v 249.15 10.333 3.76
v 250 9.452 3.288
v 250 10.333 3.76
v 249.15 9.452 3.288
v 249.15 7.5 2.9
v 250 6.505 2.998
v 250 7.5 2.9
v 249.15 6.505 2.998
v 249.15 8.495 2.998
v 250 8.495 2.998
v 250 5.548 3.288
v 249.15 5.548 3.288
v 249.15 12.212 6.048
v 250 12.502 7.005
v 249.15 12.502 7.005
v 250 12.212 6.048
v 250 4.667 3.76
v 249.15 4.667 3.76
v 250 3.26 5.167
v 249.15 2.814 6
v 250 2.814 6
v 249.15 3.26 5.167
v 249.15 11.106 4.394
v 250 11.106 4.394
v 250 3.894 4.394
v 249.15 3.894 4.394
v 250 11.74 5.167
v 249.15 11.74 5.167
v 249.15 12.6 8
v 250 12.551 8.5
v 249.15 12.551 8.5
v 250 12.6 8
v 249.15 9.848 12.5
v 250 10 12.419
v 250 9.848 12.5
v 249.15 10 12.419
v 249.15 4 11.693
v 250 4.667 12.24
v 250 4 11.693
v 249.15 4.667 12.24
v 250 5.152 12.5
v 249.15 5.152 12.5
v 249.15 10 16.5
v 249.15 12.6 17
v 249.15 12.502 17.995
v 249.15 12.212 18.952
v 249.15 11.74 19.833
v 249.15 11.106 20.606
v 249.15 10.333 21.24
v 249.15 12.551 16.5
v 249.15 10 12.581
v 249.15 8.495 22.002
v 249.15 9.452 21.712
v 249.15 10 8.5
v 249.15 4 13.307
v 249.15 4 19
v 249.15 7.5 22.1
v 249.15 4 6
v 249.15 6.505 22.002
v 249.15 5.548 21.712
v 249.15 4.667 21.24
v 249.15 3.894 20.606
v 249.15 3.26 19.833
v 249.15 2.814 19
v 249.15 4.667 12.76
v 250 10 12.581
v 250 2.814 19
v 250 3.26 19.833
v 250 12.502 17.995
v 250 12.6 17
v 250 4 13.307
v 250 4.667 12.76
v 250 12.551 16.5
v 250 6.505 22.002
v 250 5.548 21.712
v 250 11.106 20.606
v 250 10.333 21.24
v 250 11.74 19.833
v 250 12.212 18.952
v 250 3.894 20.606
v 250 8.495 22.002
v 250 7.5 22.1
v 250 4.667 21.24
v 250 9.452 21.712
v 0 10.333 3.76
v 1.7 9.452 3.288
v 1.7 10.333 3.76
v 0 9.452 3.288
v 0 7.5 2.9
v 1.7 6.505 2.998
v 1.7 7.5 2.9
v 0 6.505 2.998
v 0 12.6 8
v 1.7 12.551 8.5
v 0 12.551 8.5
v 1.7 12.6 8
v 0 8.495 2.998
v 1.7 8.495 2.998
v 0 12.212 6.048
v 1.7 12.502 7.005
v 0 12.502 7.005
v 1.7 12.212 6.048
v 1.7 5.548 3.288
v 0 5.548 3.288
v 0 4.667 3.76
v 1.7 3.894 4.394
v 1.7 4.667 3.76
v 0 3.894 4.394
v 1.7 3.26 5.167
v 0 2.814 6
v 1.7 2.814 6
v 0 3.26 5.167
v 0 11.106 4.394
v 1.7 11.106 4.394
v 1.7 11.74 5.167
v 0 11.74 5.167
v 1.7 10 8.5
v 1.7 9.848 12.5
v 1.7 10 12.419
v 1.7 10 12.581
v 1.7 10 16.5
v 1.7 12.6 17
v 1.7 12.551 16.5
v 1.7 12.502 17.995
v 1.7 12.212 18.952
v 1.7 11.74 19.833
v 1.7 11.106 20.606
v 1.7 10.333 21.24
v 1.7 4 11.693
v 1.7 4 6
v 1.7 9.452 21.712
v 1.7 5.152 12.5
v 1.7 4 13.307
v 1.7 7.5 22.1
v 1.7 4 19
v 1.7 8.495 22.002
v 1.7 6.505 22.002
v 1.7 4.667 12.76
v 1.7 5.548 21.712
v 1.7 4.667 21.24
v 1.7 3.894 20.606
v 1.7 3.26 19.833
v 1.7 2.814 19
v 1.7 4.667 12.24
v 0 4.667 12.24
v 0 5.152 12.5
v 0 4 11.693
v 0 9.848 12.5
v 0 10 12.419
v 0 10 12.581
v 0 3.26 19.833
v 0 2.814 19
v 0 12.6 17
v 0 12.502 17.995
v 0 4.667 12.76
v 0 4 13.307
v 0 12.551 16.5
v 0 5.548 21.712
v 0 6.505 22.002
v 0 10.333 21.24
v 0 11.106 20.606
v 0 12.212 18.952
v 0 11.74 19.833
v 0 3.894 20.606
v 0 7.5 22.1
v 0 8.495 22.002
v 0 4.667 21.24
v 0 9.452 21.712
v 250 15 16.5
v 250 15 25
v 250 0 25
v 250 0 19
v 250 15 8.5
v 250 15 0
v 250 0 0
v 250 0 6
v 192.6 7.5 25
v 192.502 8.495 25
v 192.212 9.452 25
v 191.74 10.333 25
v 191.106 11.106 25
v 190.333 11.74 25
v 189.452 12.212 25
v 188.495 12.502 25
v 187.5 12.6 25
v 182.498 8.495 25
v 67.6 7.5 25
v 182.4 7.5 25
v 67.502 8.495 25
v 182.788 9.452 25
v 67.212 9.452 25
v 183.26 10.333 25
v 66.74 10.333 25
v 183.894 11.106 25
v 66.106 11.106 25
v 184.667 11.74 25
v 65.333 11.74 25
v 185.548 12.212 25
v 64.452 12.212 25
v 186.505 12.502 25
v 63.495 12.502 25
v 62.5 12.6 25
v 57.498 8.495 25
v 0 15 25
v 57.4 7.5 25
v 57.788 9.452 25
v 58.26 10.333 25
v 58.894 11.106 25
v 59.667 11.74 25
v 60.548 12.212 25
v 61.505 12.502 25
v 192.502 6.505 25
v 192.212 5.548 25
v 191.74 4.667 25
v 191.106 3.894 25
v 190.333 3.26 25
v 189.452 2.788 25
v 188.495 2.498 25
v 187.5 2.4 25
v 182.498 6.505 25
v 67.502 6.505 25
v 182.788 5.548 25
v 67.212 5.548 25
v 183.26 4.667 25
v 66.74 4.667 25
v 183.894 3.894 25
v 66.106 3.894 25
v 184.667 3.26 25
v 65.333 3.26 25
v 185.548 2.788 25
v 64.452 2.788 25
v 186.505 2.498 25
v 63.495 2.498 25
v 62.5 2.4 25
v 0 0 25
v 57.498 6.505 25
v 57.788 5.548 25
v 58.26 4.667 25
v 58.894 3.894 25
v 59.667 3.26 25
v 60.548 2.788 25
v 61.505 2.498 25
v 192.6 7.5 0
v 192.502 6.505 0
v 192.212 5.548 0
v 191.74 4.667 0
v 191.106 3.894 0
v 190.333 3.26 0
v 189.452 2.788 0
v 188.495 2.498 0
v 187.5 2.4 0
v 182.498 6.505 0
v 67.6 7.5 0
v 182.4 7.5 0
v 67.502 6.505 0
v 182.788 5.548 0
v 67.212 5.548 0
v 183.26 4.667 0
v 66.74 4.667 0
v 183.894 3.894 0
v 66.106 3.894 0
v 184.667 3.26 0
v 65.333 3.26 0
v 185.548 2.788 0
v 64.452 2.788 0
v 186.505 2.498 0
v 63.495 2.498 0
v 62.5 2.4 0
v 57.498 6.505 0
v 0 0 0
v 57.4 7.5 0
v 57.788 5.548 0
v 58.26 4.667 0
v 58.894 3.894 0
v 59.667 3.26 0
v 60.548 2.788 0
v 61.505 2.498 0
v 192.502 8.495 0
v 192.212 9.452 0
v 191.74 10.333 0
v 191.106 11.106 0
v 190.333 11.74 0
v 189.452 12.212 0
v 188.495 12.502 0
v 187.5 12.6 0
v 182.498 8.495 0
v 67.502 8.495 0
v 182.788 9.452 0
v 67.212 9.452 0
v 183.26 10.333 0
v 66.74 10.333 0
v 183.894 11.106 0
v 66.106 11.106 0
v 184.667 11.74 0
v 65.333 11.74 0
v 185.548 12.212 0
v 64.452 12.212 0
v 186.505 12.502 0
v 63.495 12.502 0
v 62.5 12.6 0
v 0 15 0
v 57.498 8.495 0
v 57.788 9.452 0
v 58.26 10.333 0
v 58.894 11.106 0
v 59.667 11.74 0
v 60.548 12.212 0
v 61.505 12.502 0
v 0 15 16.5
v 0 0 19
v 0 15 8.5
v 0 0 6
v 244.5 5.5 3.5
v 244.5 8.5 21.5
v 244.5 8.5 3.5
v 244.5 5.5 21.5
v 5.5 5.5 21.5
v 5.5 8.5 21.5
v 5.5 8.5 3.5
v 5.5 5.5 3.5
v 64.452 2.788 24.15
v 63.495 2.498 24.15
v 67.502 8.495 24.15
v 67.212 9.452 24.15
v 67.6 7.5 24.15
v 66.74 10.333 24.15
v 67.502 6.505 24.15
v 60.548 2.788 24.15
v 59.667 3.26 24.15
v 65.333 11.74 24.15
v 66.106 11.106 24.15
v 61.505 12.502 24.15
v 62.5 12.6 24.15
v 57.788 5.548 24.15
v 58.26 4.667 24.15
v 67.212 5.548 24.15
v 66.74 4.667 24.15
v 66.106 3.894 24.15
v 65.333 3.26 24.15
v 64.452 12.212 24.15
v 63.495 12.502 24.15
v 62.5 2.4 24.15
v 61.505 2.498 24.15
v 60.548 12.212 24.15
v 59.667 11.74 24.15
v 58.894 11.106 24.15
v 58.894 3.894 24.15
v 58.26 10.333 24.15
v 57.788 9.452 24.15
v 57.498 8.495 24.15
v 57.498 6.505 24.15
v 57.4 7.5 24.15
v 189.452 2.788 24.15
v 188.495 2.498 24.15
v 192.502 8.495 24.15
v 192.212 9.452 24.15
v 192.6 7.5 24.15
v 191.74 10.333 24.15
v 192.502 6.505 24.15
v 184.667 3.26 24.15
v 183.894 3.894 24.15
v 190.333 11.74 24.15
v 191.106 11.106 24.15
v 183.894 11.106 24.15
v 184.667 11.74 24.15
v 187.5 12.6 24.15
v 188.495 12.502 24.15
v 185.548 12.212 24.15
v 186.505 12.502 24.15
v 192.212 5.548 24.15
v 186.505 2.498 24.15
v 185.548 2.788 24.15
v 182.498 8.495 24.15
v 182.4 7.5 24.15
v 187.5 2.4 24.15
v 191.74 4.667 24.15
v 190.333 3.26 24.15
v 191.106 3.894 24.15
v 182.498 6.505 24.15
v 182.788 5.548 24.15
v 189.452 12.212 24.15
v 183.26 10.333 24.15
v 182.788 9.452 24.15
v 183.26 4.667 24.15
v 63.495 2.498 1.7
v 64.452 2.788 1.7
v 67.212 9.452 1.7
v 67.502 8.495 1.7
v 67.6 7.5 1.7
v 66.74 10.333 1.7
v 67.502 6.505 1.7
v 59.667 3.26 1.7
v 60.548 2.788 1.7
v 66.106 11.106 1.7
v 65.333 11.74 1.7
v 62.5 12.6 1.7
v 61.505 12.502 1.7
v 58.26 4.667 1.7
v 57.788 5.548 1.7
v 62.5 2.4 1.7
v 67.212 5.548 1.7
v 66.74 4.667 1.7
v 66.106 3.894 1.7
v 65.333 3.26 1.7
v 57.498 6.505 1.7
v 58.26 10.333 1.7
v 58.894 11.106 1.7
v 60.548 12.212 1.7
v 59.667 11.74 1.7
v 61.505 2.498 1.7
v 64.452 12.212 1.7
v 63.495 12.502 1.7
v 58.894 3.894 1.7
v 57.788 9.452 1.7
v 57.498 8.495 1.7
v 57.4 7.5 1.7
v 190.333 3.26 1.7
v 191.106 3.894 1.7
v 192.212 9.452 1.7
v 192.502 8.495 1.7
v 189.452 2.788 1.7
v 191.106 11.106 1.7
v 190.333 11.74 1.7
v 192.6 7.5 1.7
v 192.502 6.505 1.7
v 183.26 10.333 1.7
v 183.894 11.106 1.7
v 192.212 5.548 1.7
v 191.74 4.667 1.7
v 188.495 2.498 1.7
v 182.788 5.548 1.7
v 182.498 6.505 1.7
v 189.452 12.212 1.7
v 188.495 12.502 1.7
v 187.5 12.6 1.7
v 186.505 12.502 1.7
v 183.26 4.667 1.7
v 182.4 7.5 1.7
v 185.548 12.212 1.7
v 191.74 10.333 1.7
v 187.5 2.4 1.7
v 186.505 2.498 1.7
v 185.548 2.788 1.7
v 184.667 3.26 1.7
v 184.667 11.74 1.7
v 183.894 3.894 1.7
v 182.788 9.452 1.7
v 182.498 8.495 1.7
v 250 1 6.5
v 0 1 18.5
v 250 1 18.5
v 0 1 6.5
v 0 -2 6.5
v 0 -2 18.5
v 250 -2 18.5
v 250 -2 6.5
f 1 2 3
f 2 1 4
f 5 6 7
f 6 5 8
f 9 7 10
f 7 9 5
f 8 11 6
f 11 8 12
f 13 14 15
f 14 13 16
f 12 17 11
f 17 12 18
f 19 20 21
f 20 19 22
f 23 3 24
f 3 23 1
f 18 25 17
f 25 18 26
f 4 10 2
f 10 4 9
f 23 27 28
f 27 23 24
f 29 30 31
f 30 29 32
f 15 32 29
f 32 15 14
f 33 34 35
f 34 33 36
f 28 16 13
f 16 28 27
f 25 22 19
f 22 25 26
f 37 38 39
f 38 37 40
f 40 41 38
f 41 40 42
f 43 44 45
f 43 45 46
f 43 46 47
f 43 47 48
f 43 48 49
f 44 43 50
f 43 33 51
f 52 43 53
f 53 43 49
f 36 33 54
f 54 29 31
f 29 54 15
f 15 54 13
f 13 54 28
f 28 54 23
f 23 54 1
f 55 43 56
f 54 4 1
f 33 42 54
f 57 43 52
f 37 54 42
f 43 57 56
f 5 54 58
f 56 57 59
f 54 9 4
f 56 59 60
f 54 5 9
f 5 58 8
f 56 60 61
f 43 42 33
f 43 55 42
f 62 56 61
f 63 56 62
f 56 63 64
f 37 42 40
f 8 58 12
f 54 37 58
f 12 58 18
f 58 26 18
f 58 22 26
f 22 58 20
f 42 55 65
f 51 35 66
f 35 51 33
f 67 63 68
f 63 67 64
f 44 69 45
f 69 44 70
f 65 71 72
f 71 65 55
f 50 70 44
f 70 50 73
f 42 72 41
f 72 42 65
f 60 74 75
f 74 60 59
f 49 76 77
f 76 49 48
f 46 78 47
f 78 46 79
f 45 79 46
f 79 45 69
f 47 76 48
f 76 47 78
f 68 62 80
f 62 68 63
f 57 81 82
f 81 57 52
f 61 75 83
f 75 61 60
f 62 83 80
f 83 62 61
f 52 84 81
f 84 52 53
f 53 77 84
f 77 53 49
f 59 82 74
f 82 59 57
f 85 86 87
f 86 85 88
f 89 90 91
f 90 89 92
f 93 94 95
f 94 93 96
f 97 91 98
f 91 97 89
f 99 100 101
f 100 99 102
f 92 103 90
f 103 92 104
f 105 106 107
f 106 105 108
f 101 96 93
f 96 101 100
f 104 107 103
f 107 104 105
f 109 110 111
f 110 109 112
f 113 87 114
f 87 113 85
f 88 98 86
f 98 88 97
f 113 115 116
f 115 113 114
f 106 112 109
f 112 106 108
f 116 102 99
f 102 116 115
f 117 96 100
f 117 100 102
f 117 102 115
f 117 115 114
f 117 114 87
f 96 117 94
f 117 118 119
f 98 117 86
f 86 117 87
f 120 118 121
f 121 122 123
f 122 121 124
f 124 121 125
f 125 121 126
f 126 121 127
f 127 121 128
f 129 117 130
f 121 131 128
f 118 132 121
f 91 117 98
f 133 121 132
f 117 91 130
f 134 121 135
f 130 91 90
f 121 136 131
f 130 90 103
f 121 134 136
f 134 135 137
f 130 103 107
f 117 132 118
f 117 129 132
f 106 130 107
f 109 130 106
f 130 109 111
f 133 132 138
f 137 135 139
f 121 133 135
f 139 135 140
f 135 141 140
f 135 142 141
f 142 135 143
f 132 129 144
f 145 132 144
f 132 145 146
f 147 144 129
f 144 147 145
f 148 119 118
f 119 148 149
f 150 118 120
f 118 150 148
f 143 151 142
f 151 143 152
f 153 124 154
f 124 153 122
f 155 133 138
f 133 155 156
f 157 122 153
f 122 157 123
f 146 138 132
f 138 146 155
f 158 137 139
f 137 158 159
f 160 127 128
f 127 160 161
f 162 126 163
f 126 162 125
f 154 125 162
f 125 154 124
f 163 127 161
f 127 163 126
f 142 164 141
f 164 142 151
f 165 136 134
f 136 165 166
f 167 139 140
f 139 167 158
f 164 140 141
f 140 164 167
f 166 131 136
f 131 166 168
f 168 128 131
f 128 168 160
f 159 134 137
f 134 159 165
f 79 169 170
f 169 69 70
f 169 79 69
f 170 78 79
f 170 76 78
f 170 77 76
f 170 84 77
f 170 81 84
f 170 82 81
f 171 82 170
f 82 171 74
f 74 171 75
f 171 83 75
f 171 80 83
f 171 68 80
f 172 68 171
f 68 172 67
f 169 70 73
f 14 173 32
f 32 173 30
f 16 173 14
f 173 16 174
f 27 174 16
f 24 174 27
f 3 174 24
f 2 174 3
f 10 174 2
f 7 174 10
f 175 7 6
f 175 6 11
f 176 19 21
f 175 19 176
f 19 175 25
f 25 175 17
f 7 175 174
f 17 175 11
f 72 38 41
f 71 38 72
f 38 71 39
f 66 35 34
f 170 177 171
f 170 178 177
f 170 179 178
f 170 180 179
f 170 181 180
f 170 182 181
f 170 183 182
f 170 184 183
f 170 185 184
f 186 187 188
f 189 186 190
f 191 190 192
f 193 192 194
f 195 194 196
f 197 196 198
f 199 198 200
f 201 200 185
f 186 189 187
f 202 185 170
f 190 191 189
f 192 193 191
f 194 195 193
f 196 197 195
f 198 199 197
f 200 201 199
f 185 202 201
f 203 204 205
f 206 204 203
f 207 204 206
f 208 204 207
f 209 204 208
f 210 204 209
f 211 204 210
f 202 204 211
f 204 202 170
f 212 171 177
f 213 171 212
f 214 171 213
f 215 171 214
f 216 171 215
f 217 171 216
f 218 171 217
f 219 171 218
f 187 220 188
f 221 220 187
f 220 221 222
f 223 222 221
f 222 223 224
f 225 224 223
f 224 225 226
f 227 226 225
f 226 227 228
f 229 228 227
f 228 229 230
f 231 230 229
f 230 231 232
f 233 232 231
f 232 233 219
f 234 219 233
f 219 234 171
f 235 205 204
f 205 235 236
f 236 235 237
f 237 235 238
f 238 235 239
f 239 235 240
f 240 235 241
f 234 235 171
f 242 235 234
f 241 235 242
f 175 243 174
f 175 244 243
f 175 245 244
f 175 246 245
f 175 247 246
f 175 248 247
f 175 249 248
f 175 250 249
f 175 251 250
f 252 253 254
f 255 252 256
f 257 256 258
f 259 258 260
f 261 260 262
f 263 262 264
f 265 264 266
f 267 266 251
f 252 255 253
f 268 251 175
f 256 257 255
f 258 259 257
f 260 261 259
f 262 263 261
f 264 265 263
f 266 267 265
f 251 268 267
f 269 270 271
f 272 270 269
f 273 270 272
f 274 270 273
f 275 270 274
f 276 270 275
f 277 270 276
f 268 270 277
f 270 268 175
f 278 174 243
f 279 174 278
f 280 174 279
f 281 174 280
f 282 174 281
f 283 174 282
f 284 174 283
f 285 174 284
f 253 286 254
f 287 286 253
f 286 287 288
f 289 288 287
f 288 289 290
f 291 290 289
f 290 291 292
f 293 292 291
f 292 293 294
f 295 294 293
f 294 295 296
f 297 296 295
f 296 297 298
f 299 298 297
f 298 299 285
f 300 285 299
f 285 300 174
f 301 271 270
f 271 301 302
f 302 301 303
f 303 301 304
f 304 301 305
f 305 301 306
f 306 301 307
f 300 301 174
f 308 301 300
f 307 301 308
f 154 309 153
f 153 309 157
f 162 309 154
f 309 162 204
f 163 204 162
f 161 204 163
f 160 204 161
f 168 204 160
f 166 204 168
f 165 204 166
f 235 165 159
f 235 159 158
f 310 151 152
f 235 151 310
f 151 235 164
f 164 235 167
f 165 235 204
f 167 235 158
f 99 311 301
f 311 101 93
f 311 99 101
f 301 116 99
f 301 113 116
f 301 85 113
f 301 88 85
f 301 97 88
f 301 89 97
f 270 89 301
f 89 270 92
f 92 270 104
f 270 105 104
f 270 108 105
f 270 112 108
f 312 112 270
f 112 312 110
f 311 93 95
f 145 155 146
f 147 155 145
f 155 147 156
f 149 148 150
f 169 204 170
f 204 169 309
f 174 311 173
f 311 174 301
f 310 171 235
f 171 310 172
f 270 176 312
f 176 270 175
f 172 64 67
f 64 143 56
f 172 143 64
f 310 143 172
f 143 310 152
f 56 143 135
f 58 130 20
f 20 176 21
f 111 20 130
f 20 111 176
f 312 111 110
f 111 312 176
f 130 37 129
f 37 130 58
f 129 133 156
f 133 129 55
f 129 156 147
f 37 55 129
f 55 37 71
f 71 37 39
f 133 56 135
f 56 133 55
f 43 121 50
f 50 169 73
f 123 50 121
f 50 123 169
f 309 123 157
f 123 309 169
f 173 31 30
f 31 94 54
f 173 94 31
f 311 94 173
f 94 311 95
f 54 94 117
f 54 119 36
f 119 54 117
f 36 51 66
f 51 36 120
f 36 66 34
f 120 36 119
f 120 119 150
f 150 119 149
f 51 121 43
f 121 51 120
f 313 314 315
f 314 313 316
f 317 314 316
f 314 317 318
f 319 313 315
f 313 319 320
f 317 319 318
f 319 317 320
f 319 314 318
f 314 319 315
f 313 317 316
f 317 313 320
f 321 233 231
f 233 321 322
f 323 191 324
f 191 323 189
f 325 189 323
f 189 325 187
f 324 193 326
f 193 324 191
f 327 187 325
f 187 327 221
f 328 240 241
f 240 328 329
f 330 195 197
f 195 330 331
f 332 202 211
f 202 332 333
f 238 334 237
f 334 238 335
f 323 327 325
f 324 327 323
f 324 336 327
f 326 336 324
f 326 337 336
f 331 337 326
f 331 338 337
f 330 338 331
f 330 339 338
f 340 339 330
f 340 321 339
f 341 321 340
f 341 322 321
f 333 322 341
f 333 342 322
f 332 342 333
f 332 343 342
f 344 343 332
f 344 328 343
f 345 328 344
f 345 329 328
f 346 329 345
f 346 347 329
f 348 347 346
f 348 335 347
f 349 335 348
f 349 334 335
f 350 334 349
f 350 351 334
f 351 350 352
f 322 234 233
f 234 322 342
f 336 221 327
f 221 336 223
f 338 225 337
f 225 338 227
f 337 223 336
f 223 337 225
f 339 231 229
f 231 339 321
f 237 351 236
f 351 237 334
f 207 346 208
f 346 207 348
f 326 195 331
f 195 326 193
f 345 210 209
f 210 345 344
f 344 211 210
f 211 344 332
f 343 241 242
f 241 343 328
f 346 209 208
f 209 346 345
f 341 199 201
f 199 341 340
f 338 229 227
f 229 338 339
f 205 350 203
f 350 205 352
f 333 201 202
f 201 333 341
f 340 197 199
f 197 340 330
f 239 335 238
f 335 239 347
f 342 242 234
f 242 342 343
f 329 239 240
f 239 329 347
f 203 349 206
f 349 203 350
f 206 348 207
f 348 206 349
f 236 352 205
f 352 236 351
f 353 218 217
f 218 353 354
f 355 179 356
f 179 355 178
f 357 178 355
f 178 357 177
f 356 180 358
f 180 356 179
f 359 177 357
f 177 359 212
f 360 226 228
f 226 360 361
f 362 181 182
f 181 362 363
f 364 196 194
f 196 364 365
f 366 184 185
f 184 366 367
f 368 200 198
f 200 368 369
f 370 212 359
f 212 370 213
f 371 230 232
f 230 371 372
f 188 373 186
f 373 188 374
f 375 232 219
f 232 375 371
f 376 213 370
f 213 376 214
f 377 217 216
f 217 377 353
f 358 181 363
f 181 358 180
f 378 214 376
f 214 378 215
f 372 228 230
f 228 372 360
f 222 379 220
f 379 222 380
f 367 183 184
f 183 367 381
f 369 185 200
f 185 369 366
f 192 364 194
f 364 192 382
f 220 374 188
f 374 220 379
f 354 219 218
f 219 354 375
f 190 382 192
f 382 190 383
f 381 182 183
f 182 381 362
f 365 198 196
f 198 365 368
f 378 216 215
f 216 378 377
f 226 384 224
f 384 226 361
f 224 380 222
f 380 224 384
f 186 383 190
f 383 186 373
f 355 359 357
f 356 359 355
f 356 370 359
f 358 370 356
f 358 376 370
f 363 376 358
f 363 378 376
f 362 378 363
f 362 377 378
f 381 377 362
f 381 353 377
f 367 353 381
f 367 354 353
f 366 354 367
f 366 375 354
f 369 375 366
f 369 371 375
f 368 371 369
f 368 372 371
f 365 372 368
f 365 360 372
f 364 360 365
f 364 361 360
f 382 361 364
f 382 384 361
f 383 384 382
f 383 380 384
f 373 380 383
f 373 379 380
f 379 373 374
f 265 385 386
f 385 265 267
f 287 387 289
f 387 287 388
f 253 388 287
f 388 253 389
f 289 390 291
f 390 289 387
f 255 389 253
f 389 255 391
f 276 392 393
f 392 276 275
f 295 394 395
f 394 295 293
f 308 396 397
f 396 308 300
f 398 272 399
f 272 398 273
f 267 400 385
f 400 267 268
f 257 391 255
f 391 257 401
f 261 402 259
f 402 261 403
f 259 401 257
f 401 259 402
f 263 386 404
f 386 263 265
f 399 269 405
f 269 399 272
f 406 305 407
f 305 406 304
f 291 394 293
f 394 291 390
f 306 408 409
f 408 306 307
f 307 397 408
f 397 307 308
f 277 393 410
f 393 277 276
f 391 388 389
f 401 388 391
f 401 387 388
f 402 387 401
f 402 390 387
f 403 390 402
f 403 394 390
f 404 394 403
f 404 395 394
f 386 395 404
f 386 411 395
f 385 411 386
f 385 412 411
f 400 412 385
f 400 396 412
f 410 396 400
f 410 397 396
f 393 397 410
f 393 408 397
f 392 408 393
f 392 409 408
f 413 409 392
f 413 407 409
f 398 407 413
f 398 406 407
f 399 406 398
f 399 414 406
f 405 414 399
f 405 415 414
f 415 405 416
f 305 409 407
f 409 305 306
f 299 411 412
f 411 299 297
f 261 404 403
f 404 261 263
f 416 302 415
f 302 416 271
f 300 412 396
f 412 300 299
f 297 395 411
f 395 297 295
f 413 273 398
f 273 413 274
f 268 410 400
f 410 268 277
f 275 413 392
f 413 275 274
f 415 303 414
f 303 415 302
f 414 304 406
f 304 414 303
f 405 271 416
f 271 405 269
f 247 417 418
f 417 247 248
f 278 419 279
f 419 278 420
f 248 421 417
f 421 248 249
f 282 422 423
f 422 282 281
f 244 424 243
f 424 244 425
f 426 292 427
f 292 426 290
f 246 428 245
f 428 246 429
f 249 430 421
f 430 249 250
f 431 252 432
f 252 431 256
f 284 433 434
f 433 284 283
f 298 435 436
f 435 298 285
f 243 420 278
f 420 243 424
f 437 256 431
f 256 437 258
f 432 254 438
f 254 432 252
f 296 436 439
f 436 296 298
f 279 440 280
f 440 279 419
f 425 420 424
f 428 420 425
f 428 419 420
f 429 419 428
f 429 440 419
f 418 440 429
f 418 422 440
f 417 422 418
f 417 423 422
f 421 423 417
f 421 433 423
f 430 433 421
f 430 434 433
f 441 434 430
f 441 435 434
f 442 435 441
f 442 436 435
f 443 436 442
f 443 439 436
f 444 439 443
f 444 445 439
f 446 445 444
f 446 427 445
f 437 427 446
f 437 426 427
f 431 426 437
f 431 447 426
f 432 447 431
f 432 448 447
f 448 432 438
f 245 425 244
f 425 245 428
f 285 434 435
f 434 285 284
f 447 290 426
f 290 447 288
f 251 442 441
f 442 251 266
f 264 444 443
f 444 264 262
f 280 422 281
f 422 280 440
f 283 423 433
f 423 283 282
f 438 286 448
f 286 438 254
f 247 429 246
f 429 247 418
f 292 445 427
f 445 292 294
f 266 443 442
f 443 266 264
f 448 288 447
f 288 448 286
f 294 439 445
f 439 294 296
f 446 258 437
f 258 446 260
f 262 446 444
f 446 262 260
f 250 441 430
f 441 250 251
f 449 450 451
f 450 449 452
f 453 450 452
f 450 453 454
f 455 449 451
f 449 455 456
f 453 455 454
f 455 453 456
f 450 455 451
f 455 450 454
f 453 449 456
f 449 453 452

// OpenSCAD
/*
 * Compact LED Strip Module - 25mm Height
 * Three types: END, MIDDLE, or ALL (all have magnets both sides)
 */

// ========== CONFIGURATION ==========

// LED Strip dimensions
strip_segment_length = 250;  // Length of this module
strip_width = 12;            // WS2812B strip width

// Module dimensions (COMPACT!)
module_width = strip_segment_length;
module_height = 25;          // Only 2.5cm tall!
module_depth = 15;           // Thin profile
wall_thickness = 1.5;

// LED channel (on front)
led_channel_depth = 4;
led_channel_width = 13;

// Wire channel (on back)
wire_channel_width = 8;
wire_channel_depth = 5;

// Magnets (adjusted for user's magnets: 10mm dia × 1.54mm thick)
magnet_dia = 10.2;           // 10mm + 0.2mm tolerance
magnet_thickness = 1.7;      // 1.54mm + tolerance (thin magnets!)
magnet_inset = 8;

// Module type - CHANGE THIS!
module_type = "middle";      // "end_left", "middle", "end_right", or "all"
show_led_strip = true;       // Show LED visualization

// ========== MODULE BUILDER ==========

module compact_holder(type="middle") {
    difference() {
        // Main body
        cube([module_width, module_depth, module_height]);

        // Front LED channel (OPEN ENDS)
        translate([-0.1, -0.1, module_height/2 - led_channel_width/2])
            cube([module_width + 0.2, led_channel_depth + 0.1, led_channel_width]);

        // Back wire channel (OPEN ENDS)
        translate([-0.1, module_depth - wire_channel_depth, module_height/2 - wire_channel_width/2])
            cube([module_width + 0.2, wire_channel_depth + 0.1, wire_channel_width]);

        // Center cavity (weight reduction)
        translate([wall_thickness + 4, led_channel_depth + wall_thickness, wall_thickness + 2])
            cube([module_width - 2*wall_thickness - 8,
                  module_depth - led_channel_depth - wire_channel_depth - 2*wall_thickness,
                  module_height - 2*wall_thickness - 4]);

        // HORIZONTAL magnets (left/right sides)
        // RIGHT side magnets
        if (type == "middle" || type == "end_left" || type == "all") {
            translate([module_width - magnet_thickness/2, module_depth/2, magnet_inset])
                rotate([0, 90, 0])
                cylinder(h=magnet_thickness + 0.1, d=magnet_dia, $fn=32);
            translate([module_width - magnet_thickness/2, module_depth/2, module_height - magnet_inset])
                rotate([0, 90, 0])
                cylinder(h=magnet_thickness + 0.1, d=magnet_dia, $fn=32);
        }

        // LEFT side magnets
        if (type == "middle" || type == "end_right" || type == "all") {
            translate([-0.1, module_depth/2, magnet_inset])
                rotate([0, 90, 0])
                cylinder(h=magnet_thickness + 0.1, d=magnet_dia, $fn=32);
            translate([-0.1, module_depth/2, module_height - magnet_inset])
                rotate([0, 90, 0])
                cylinder(h=magnet_thickness + 0.1, d=magnet_dia, $fn=32);
        }

        // VERTICAL magnets (top/bottom) - ALL types have these
        // Top
        translate([module_width/4, module_depth/2, module_height - magnet_thickness/2])
            cylinder(h=magnet_thickness + 0.1, d=magnet_dia, $fn=32);
        translate([3*module_width/4, module_depth/2, module_height - magnet_thickness/2])
            cylinder(h=magnet_thickness + 0.1, d=magnet_dia, $fn=32);

        // Bottom
        translate([module_width/4, module_depth/2, -0.1])
            cylinder(h=magnet_thickness + 0.1, d=magnet_dia, $fn=32);
        translate([3*module_width/4, module_depth/2, -0.1])
            cylinder(h=magnet_thickness + 0.1, d=magnet_dia, $fn=32);
    }
}

// LED strip visualization
module led_strip_visual() {
    color("white", 0.9)
    translate([0, led_channel_depth - 3, module_height/2 - strip_width/2])
    rotate([90, 0, 0])
    cube([module_width, strip_width, 3]);

    // LEDs
    led_spacing = module_width / 36;
    for (i = [0:35]) {
        color("gold", 0.8)
        translate([i * led_spacing + led_spacing/2, 1, module_height/2])
            rotate([90, 0, 0])
            cylinder(h=2, d=4, $fn=6);
    }
}

// ========== RENDER ==========

compact_holder(module_type);

if (show_led_strip) {
    led_strip_visual();
}

// ========== NOTES ==========
/*
 * COMPACT DESIGN - 25mm tall!
 *
 * Dimensions: 250mm (L) × 25mm (H) × 15mm (D)
 * Weight: ~12-15g per module
 *
 * MODULE TYPES:
 * - "end_left":   Magnets on RIGHT side only (left end of row)
 * - "middle":     Magnets on BOTH sides (middle connectors)
 * - "end_right":  Magnets on LEFT side only (right end of row)
 * - "all":        Magnets on BOTH sides (maximum flexibility)
 *
 * RECOMMENDED: Use "all" type for maximum flexibility!
 * This lets you rearrange modules anywhere.
 *
 * FOR 9 ROWS × 4 MODULES:
 * - Option A (specific ends): 9× end_left, 18× middle, 9× end_right
 * - Option B (all flexible):  36× all (recommended!)
 *
 * EXPORT:
 * openscad -D 'module_type="middle"' -D 'show_led_strip=false' -o middle.stl module_compact.scad
 * openscad -D 'module_type="all"' -D 'show_led_strip=false' -o module_25mm.stl module_compact.scad
 */
